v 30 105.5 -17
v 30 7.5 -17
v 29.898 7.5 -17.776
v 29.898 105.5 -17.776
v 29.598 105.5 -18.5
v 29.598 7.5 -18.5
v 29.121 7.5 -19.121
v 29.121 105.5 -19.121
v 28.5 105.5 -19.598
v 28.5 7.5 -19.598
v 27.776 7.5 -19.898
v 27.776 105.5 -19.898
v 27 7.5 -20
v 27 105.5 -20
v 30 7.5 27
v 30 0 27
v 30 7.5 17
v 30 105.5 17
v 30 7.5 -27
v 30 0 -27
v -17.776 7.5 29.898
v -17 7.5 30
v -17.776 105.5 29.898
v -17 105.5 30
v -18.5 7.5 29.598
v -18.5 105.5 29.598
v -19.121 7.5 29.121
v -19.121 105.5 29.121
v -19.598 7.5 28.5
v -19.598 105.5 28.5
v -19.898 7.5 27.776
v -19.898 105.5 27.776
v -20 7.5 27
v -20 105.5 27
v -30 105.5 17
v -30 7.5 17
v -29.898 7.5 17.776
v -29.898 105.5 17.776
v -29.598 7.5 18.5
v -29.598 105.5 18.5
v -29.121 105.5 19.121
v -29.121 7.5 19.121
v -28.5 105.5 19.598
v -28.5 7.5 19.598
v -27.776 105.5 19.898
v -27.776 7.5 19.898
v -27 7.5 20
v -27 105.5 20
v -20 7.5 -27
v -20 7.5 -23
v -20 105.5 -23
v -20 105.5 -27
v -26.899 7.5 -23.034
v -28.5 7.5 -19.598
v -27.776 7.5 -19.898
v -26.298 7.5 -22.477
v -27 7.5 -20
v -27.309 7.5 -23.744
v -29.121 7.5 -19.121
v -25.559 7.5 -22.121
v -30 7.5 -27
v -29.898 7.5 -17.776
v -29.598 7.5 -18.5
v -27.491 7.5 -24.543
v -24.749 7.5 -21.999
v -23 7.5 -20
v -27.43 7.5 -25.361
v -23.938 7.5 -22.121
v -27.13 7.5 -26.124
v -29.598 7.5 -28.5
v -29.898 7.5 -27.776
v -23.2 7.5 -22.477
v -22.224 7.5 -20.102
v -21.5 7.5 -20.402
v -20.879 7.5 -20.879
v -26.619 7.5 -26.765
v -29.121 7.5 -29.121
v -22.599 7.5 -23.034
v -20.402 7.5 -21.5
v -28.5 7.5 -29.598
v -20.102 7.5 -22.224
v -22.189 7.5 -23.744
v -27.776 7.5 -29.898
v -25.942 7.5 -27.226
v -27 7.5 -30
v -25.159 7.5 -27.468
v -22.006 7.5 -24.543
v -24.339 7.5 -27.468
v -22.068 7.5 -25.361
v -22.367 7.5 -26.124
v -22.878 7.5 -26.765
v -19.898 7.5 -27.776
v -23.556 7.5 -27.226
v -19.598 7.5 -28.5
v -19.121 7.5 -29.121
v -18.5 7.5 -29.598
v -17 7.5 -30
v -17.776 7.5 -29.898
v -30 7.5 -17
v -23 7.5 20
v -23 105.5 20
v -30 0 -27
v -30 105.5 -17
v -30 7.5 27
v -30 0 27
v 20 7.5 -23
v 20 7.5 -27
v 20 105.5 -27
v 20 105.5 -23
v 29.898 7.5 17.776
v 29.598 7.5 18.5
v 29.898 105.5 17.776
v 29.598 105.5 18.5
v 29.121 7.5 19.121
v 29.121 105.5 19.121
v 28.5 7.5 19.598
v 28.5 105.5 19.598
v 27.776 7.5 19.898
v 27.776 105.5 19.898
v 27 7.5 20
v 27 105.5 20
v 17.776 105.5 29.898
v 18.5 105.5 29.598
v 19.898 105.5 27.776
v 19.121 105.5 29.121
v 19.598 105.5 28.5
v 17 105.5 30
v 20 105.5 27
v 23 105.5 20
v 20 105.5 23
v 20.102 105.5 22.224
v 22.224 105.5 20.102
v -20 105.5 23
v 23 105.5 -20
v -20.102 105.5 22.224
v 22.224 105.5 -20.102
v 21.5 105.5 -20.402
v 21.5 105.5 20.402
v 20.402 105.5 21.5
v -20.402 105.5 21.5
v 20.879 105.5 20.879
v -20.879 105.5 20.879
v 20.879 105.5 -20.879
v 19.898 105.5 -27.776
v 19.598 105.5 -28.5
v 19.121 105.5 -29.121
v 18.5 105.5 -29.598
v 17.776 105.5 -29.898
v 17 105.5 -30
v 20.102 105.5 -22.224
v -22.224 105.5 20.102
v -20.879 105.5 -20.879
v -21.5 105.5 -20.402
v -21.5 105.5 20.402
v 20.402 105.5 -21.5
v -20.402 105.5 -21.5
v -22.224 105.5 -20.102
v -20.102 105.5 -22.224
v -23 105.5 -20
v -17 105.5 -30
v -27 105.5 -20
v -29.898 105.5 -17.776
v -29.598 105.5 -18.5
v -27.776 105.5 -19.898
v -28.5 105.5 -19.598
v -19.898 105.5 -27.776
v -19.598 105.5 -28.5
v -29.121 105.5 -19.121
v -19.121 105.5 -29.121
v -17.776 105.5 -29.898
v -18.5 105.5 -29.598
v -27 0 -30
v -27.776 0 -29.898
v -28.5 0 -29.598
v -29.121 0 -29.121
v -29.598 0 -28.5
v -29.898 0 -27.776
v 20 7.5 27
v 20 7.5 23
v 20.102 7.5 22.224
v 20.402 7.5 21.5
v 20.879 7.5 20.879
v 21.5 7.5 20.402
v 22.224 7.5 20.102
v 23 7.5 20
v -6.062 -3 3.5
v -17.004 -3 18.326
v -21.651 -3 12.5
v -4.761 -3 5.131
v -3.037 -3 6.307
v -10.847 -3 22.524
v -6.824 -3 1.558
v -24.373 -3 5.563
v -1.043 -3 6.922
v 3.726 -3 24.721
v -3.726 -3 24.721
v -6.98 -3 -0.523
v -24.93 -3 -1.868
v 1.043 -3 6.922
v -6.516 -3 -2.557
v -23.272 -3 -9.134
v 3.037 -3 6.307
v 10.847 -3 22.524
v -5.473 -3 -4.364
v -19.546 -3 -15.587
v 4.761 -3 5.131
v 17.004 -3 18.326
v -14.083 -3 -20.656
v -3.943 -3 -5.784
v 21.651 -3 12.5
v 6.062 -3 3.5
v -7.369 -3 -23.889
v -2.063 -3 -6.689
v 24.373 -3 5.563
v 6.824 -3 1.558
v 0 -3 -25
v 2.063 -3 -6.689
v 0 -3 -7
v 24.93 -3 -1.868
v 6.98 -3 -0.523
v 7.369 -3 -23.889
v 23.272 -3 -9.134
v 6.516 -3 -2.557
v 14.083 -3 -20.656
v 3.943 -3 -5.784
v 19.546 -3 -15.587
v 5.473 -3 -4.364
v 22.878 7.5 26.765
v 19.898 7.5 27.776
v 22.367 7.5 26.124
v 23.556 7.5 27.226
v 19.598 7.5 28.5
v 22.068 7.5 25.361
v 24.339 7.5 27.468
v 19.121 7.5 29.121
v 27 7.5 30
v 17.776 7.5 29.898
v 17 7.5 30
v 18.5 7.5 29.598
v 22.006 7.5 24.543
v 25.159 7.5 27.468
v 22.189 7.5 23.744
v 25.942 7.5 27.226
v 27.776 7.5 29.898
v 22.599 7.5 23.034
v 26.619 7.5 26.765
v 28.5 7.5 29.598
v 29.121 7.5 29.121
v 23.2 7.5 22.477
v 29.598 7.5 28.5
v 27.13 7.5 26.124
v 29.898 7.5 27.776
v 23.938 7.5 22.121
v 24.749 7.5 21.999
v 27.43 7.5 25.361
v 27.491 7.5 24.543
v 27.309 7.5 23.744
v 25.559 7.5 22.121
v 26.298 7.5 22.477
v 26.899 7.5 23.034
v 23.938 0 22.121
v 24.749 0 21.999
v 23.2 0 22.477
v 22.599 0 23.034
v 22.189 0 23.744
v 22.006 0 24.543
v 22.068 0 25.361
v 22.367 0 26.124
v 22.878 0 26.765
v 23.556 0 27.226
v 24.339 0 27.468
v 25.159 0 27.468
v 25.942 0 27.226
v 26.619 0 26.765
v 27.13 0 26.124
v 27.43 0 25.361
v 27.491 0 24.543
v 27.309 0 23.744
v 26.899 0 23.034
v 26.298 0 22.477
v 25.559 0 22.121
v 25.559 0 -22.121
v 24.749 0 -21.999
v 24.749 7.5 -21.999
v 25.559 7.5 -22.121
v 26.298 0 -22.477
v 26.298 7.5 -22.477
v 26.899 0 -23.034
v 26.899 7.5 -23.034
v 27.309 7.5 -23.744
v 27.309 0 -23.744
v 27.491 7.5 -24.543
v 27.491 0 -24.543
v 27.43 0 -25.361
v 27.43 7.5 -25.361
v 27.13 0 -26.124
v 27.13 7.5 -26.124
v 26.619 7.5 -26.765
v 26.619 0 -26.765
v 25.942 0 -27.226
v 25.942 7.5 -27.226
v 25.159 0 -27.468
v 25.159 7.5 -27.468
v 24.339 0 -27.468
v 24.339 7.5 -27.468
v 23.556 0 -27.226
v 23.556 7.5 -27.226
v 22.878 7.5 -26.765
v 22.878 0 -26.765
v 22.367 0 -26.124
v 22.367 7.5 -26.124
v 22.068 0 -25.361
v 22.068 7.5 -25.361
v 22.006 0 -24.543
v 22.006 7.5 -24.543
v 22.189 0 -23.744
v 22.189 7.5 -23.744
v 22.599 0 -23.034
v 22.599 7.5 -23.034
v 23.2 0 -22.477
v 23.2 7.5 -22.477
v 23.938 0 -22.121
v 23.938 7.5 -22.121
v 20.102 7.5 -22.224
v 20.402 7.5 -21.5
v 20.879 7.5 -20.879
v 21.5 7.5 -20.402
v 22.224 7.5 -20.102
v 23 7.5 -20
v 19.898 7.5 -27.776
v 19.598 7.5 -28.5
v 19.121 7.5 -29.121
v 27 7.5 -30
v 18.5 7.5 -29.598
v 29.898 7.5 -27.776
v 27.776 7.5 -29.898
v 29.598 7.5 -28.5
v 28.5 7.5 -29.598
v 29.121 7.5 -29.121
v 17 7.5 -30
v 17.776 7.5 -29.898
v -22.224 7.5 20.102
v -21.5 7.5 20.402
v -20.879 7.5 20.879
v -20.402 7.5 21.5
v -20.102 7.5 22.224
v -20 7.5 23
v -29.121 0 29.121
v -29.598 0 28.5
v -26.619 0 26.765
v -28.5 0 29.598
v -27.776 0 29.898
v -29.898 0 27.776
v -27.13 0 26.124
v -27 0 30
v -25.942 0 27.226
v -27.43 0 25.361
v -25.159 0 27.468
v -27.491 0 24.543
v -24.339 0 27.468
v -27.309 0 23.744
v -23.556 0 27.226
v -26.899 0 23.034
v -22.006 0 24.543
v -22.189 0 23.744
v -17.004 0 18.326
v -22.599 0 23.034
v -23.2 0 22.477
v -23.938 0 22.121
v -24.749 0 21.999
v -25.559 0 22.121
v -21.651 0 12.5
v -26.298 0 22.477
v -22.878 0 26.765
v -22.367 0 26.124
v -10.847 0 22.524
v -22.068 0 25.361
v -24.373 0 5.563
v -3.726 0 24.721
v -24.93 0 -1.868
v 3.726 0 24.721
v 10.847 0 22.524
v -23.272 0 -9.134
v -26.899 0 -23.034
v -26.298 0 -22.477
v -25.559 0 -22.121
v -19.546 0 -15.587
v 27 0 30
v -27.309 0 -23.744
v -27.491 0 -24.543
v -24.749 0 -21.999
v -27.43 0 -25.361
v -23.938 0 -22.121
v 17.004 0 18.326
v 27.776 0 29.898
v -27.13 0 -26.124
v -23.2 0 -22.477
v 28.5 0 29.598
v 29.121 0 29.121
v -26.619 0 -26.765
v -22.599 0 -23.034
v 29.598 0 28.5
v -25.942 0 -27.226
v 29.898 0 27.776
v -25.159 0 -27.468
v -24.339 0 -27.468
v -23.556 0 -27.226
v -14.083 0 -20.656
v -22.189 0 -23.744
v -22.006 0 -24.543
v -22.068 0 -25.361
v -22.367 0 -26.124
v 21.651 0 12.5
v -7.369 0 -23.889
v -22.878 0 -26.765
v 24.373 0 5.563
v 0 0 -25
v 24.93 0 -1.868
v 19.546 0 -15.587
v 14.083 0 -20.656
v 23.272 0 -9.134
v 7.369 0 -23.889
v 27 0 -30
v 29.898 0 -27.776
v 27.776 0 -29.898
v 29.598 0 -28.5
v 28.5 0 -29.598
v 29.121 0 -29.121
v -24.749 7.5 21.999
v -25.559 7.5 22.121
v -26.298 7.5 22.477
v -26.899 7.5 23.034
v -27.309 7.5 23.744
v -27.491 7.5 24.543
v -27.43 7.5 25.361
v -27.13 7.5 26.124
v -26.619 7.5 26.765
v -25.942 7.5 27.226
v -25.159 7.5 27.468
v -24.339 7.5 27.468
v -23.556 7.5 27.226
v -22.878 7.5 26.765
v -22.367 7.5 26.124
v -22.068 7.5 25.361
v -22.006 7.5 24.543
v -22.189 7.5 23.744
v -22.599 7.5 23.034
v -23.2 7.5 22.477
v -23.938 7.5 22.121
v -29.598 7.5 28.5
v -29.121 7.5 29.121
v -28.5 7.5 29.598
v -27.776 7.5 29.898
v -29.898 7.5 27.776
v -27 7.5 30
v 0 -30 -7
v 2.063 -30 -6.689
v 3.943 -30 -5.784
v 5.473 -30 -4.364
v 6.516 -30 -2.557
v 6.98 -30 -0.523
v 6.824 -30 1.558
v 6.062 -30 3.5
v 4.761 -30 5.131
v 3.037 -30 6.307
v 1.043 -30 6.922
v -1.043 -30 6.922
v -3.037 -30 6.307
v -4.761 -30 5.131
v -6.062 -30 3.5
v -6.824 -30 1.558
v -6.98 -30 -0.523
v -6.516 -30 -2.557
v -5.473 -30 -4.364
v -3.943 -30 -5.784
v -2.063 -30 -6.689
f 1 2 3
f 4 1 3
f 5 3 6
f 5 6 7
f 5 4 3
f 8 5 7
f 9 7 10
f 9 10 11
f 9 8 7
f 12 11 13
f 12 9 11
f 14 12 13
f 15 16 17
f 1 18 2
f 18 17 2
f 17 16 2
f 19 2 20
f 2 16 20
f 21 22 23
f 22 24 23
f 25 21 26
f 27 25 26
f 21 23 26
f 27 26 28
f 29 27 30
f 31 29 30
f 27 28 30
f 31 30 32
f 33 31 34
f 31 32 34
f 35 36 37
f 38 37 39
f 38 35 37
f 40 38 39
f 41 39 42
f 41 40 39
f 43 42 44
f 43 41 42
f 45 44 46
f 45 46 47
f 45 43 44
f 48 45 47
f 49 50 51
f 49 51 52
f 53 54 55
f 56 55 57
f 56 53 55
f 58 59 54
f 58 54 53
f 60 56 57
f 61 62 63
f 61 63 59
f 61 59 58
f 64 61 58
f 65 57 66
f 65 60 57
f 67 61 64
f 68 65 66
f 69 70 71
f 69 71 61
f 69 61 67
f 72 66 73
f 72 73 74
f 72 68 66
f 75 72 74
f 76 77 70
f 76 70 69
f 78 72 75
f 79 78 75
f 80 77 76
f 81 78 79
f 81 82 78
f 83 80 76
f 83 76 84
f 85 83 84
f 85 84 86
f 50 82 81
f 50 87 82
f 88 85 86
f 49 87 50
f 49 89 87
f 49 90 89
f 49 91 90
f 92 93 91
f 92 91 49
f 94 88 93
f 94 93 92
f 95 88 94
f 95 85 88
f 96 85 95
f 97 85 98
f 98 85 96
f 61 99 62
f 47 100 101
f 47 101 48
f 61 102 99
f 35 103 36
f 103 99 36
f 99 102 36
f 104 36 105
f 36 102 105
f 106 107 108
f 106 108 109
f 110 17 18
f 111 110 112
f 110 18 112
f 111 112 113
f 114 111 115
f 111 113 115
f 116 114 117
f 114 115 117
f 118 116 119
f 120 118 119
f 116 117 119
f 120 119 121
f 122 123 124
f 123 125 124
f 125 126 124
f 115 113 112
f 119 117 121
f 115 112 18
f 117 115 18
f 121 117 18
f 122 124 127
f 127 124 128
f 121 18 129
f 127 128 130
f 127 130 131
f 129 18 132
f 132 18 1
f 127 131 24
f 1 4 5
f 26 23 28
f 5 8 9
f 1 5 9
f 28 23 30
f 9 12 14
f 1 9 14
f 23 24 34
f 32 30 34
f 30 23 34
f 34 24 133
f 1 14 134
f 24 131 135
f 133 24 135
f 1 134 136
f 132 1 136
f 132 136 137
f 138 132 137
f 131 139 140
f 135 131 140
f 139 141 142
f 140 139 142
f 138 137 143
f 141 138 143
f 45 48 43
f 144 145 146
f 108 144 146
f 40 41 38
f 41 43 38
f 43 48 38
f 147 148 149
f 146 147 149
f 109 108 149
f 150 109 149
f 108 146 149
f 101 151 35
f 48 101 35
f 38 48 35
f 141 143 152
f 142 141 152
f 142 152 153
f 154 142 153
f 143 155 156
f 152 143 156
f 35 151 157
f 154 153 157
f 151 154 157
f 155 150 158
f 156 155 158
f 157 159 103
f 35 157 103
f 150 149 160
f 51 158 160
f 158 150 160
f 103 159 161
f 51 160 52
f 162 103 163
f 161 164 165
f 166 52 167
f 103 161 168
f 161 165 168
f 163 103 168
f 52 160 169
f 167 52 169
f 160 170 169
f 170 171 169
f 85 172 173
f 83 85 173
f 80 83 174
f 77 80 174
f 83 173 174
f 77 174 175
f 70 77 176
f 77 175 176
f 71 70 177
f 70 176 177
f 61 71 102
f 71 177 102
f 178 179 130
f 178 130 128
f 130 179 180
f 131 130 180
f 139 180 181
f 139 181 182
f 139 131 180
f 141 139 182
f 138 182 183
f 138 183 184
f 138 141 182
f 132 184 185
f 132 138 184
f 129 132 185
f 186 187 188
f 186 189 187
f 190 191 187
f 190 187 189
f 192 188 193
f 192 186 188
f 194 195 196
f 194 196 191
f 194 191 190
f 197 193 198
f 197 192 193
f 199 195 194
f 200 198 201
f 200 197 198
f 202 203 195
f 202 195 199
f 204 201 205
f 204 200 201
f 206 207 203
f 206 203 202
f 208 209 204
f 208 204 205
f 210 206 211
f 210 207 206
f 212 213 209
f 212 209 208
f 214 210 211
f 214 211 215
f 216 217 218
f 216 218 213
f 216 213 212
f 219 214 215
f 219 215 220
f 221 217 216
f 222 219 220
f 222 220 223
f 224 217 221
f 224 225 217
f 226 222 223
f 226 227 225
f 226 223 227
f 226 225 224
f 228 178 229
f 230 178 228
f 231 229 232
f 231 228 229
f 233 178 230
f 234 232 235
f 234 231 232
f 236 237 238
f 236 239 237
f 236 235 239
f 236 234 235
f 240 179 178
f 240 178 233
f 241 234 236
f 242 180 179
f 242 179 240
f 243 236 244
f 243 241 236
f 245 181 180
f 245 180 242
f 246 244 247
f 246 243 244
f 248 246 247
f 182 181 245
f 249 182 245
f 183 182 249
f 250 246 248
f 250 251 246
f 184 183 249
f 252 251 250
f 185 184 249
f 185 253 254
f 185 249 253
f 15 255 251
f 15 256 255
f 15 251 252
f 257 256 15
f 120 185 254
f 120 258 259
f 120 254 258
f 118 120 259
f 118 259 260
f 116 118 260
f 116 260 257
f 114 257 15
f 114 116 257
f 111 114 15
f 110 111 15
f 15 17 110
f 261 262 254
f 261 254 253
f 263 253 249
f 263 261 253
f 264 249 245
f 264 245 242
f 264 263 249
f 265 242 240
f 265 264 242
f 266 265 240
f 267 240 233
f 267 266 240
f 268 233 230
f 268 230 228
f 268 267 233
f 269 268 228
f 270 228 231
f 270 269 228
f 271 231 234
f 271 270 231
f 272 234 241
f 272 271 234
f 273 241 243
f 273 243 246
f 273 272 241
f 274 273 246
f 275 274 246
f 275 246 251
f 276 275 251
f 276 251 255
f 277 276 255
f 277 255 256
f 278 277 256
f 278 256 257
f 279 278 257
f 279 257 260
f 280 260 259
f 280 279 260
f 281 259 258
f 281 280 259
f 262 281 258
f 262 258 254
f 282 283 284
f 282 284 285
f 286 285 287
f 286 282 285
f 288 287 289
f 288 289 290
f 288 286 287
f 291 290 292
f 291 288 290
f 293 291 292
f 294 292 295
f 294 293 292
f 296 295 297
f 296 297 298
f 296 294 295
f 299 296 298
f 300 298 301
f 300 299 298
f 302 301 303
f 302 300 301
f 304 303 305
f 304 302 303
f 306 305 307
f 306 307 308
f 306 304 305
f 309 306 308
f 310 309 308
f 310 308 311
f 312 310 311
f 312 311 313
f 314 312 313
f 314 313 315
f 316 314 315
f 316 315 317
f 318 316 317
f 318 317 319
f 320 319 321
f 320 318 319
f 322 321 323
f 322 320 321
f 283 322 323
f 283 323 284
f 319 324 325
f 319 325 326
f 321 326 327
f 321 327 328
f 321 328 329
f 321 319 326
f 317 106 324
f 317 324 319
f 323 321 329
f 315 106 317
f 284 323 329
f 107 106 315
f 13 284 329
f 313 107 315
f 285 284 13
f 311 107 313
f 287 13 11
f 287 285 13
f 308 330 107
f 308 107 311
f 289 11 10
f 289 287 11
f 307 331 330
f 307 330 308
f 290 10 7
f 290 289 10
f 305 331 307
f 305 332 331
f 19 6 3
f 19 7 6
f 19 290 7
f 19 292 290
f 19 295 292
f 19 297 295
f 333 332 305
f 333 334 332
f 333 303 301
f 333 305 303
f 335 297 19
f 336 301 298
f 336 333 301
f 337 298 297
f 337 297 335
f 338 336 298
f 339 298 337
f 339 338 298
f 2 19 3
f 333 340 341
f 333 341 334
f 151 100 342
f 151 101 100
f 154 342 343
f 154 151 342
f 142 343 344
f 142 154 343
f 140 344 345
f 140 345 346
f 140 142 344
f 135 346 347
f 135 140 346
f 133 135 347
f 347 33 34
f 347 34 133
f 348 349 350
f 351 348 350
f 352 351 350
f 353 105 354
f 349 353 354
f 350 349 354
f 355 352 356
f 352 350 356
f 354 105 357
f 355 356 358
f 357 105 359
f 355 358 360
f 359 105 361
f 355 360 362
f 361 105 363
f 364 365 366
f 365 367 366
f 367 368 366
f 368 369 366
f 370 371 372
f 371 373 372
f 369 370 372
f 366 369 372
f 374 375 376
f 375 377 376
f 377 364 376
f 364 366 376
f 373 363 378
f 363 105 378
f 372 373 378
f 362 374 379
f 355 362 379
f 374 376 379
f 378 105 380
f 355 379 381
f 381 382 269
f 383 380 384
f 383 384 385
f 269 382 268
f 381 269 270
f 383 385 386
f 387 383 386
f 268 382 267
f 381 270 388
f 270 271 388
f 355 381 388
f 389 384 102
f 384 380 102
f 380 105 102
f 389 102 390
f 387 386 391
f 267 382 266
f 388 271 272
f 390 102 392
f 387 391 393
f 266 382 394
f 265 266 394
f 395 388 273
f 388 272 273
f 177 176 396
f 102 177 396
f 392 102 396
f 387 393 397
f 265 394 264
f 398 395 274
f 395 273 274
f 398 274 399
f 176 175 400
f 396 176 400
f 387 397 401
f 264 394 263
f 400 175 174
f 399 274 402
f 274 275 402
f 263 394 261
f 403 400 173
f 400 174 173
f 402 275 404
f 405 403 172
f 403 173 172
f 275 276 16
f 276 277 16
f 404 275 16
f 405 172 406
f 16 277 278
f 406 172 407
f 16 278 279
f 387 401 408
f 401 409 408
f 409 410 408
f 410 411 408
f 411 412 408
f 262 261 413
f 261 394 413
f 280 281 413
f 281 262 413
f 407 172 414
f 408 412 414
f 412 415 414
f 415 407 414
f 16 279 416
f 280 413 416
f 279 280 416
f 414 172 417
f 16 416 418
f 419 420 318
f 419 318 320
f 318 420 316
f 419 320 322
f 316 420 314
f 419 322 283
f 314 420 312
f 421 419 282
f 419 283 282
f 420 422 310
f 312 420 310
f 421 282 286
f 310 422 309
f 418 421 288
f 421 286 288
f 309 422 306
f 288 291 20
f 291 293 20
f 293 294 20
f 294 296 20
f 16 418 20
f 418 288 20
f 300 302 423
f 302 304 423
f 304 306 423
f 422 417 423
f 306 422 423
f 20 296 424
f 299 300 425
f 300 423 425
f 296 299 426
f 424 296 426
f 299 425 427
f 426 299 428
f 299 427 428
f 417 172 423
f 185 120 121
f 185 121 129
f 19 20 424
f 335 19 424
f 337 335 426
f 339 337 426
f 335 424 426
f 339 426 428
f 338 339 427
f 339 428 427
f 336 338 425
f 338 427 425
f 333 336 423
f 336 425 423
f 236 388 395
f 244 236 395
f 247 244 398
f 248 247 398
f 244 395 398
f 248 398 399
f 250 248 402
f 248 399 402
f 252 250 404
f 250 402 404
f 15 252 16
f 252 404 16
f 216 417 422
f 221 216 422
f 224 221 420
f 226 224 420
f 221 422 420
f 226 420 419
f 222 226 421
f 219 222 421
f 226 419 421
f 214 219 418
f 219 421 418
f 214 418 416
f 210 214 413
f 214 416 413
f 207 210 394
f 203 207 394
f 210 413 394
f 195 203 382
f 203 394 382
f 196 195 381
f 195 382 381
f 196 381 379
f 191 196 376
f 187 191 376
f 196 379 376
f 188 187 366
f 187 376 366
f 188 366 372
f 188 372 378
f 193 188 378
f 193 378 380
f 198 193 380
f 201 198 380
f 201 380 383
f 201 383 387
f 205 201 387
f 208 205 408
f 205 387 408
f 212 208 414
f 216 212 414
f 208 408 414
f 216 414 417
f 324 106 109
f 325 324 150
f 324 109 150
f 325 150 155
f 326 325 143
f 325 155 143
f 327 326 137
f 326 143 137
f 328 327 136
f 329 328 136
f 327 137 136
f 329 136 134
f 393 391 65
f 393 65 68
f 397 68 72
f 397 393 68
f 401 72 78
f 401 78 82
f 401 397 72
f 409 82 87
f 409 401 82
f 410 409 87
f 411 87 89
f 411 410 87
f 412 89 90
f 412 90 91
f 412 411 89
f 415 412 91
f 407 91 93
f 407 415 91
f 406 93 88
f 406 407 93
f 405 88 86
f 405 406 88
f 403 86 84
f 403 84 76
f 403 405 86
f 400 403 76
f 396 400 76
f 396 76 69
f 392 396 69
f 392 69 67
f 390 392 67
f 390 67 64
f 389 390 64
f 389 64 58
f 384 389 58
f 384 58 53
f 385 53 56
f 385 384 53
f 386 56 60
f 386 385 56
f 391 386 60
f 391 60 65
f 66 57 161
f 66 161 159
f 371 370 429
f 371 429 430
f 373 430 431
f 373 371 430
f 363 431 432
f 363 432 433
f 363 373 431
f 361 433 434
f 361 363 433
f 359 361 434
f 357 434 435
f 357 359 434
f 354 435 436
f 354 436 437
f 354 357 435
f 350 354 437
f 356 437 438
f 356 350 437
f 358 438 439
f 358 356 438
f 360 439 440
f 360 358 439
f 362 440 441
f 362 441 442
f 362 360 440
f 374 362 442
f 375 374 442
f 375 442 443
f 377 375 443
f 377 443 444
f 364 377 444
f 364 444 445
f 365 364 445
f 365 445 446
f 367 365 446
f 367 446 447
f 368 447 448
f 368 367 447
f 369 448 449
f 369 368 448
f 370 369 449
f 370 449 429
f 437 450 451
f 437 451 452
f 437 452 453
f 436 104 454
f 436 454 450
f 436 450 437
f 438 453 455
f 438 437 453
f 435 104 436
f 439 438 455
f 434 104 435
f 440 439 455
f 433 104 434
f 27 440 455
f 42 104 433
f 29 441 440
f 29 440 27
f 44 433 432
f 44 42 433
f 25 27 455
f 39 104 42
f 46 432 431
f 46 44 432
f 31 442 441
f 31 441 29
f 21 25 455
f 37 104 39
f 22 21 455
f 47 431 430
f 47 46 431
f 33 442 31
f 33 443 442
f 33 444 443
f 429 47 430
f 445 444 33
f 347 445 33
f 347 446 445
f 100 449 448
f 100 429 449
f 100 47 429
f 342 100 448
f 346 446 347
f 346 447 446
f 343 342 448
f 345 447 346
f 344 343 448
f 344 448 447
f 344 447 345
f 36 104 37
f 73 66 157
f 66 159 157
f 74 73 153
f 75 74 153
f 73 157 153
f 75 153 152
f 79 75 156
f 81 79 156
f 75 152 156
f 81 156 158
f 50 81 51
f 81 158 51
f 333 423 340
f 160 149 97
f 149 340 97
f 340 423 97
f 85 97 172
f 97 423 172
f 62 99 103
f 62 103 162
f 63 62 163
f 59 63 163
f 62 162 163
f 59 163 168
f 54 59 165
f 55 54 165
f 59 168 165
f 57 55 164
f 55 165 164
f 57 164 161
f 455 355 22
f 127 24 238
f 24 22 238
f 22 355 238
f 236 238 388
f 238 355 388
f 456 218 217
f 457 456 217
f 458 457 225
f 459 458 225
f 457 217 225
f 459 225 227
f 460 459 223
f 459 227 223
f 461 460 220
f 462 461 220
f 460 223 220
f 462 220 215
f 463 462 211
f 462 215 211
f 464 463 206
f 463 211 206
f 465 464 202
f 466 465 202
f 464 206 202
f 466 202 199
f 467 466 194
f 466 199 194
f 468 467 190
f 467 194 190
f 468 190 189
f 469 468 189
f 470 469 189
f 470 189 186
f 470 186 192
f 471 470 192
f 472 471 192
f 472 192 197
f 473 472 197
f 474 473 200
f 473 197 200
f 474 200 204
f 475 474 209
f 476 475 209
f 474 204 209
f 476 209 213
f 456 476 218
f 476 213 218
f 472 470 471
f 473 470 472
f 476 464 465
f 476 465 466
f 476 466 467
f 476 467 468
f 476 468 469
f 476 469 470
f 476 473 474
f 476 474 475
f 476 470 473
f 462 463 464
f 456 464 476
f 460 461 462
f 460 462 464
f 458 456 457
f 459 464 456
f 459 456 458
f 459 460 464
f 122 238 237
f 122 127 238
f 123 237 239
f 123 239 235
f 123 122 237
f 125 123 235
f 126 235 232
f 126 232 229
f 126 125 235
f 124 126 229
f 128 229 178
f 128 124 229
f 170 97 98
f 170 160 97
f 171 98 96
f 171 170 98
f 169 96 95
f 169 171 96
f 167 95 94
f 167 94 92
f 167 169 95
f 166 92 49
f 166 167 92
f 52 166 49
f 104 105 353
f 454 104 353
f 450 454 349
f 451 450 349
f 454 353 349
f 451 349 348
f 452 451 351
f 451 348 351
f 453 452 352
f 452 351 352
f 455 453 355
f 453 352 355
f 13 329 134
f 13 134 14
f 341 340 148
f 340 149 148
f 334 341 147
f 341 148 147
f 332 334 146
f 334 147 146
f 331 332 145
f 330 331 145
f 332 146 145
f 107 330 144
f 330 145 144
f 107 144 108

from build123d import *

# Parameters (mm, degrees)
SKETCH1_R           = 2.75
BOSS_EXTRUDE1_DEPTH = 7.5
BOSS_EXTRUDE2_DEPTH = 98
FILLET1_R           = 3
SKETCH4_R           = 25
BOSS_EXTRUDE4_DEPTH = 3
SKETCH5_R           = 7
BOSS_EXTRUDE5_DEPTH = 27


with BuildPart() as part:
    # Sketch1 → Boss-Extrude1 (new body)
    with BuildSketch(Plane(origin=(0, 0, 0), x_dir=(1, 0, 0), z_dir=(0, 1, 0))):
        with BuildLine():
            Line((-27, -30), (27, -30))
            ThreePointArc((27, -30), (29.121320344, -29.121320344), (30, -27))
            Line((30, -27), (30, 27))
            ThreePointArc((30, 27), (29.121320344, 29.121320344), (27, 30))
            Line((27, 30), (-27, 30))
            ThreePointArc((-27, 30), (-29.121320344, 29.121320344), (-30, 27))
            Line((-30, 27), (-30, -27))
            ThreePointArc((-30, -27), (-29.121320344, -29.121320344), (-27, -30))
        make_face()
        with Locations(Location((-24.748737342, 24.748737342, 0), (0, 0, 270))):
            Circle(SKETCH1_R, mode=Mode.SUBTRACT)
        with Locations(Location((24.748737342, 24.748737342, 0), (0, 0, 270))):
            Circle(SKETCH1_R, mode=Mode.SUBTRACT)
        with Locations(Location((-24.748737342, -24.748737342, 0), (0, 0, 90))):
            Circle(SKETCH1_R, mode=Mode.SUBTRACT)
        with Locations(Location((24.748737342, -24.748737342, 0), (0, 0, 90))):
            Circle(SKETCH1_R, mode=Mode.SUBTRACT)
    extrude(amount=BOSS_EXTRUDE1_DEPTH)

    # Sketch2 → Boss-Extrude2 (add)
    with BuildSketch(Plane(origin=(0, 7.5, 0), x_dir=(1, 0, 0), z_dir=(0, 1, 0))):
        Polygon((-20, 30), (20, 30), (20, 20), (30, 20), (30, -20), (20, -20), (20, -30), (-20, -30), (-20, -20), (-30, -20), (-30, 20), (-20, 20), align=None)
    extrude(amount=BOSS_EXTRUDE2_DEPTH)

    # Fillet1
    fillet1_edges = [part.edges().sort_by_distance(p)[0] for p in [
        (-20, 56.5, -30),
        (-20, 56.5, -20),
        (-30, 56.5, -20),
        (-30, 56.5, 20),
        (-20, 56.5, 20),
        (-20, 56.5, 30),
        (20, 56.5, 30),
        (20, 56.5, 20),
        (30, 56.5, 20),
        (30, 56.5, -20),
        (20, 56.5, -20),
        (20, 56.5, -30),
    ]]
    fillet(fillet1_edges, radius=FILLET1_R)

    # Sketch4 → Boss-Extrude4 (add)
    with BuildSketch(Plane.XZ):
        with Locations(Location((0, 0, 0), (0, 0, 270))):
            Circle(SKETCH4_R)
    extrude(amount=BOSS_EXTRUDE4_DEPTH)

    # Sketch5 → Boss-Extrude5 (add)
    with BuildSketch(Plane.XZ.offset(3)):
        with Locations(Location((0, 0, 0), (0, 0, 270))):
            Circle(SKETCH5_R)
    extrude(amount=BOSS_EXTRUDE5_DEPTH)


solid = part.part
